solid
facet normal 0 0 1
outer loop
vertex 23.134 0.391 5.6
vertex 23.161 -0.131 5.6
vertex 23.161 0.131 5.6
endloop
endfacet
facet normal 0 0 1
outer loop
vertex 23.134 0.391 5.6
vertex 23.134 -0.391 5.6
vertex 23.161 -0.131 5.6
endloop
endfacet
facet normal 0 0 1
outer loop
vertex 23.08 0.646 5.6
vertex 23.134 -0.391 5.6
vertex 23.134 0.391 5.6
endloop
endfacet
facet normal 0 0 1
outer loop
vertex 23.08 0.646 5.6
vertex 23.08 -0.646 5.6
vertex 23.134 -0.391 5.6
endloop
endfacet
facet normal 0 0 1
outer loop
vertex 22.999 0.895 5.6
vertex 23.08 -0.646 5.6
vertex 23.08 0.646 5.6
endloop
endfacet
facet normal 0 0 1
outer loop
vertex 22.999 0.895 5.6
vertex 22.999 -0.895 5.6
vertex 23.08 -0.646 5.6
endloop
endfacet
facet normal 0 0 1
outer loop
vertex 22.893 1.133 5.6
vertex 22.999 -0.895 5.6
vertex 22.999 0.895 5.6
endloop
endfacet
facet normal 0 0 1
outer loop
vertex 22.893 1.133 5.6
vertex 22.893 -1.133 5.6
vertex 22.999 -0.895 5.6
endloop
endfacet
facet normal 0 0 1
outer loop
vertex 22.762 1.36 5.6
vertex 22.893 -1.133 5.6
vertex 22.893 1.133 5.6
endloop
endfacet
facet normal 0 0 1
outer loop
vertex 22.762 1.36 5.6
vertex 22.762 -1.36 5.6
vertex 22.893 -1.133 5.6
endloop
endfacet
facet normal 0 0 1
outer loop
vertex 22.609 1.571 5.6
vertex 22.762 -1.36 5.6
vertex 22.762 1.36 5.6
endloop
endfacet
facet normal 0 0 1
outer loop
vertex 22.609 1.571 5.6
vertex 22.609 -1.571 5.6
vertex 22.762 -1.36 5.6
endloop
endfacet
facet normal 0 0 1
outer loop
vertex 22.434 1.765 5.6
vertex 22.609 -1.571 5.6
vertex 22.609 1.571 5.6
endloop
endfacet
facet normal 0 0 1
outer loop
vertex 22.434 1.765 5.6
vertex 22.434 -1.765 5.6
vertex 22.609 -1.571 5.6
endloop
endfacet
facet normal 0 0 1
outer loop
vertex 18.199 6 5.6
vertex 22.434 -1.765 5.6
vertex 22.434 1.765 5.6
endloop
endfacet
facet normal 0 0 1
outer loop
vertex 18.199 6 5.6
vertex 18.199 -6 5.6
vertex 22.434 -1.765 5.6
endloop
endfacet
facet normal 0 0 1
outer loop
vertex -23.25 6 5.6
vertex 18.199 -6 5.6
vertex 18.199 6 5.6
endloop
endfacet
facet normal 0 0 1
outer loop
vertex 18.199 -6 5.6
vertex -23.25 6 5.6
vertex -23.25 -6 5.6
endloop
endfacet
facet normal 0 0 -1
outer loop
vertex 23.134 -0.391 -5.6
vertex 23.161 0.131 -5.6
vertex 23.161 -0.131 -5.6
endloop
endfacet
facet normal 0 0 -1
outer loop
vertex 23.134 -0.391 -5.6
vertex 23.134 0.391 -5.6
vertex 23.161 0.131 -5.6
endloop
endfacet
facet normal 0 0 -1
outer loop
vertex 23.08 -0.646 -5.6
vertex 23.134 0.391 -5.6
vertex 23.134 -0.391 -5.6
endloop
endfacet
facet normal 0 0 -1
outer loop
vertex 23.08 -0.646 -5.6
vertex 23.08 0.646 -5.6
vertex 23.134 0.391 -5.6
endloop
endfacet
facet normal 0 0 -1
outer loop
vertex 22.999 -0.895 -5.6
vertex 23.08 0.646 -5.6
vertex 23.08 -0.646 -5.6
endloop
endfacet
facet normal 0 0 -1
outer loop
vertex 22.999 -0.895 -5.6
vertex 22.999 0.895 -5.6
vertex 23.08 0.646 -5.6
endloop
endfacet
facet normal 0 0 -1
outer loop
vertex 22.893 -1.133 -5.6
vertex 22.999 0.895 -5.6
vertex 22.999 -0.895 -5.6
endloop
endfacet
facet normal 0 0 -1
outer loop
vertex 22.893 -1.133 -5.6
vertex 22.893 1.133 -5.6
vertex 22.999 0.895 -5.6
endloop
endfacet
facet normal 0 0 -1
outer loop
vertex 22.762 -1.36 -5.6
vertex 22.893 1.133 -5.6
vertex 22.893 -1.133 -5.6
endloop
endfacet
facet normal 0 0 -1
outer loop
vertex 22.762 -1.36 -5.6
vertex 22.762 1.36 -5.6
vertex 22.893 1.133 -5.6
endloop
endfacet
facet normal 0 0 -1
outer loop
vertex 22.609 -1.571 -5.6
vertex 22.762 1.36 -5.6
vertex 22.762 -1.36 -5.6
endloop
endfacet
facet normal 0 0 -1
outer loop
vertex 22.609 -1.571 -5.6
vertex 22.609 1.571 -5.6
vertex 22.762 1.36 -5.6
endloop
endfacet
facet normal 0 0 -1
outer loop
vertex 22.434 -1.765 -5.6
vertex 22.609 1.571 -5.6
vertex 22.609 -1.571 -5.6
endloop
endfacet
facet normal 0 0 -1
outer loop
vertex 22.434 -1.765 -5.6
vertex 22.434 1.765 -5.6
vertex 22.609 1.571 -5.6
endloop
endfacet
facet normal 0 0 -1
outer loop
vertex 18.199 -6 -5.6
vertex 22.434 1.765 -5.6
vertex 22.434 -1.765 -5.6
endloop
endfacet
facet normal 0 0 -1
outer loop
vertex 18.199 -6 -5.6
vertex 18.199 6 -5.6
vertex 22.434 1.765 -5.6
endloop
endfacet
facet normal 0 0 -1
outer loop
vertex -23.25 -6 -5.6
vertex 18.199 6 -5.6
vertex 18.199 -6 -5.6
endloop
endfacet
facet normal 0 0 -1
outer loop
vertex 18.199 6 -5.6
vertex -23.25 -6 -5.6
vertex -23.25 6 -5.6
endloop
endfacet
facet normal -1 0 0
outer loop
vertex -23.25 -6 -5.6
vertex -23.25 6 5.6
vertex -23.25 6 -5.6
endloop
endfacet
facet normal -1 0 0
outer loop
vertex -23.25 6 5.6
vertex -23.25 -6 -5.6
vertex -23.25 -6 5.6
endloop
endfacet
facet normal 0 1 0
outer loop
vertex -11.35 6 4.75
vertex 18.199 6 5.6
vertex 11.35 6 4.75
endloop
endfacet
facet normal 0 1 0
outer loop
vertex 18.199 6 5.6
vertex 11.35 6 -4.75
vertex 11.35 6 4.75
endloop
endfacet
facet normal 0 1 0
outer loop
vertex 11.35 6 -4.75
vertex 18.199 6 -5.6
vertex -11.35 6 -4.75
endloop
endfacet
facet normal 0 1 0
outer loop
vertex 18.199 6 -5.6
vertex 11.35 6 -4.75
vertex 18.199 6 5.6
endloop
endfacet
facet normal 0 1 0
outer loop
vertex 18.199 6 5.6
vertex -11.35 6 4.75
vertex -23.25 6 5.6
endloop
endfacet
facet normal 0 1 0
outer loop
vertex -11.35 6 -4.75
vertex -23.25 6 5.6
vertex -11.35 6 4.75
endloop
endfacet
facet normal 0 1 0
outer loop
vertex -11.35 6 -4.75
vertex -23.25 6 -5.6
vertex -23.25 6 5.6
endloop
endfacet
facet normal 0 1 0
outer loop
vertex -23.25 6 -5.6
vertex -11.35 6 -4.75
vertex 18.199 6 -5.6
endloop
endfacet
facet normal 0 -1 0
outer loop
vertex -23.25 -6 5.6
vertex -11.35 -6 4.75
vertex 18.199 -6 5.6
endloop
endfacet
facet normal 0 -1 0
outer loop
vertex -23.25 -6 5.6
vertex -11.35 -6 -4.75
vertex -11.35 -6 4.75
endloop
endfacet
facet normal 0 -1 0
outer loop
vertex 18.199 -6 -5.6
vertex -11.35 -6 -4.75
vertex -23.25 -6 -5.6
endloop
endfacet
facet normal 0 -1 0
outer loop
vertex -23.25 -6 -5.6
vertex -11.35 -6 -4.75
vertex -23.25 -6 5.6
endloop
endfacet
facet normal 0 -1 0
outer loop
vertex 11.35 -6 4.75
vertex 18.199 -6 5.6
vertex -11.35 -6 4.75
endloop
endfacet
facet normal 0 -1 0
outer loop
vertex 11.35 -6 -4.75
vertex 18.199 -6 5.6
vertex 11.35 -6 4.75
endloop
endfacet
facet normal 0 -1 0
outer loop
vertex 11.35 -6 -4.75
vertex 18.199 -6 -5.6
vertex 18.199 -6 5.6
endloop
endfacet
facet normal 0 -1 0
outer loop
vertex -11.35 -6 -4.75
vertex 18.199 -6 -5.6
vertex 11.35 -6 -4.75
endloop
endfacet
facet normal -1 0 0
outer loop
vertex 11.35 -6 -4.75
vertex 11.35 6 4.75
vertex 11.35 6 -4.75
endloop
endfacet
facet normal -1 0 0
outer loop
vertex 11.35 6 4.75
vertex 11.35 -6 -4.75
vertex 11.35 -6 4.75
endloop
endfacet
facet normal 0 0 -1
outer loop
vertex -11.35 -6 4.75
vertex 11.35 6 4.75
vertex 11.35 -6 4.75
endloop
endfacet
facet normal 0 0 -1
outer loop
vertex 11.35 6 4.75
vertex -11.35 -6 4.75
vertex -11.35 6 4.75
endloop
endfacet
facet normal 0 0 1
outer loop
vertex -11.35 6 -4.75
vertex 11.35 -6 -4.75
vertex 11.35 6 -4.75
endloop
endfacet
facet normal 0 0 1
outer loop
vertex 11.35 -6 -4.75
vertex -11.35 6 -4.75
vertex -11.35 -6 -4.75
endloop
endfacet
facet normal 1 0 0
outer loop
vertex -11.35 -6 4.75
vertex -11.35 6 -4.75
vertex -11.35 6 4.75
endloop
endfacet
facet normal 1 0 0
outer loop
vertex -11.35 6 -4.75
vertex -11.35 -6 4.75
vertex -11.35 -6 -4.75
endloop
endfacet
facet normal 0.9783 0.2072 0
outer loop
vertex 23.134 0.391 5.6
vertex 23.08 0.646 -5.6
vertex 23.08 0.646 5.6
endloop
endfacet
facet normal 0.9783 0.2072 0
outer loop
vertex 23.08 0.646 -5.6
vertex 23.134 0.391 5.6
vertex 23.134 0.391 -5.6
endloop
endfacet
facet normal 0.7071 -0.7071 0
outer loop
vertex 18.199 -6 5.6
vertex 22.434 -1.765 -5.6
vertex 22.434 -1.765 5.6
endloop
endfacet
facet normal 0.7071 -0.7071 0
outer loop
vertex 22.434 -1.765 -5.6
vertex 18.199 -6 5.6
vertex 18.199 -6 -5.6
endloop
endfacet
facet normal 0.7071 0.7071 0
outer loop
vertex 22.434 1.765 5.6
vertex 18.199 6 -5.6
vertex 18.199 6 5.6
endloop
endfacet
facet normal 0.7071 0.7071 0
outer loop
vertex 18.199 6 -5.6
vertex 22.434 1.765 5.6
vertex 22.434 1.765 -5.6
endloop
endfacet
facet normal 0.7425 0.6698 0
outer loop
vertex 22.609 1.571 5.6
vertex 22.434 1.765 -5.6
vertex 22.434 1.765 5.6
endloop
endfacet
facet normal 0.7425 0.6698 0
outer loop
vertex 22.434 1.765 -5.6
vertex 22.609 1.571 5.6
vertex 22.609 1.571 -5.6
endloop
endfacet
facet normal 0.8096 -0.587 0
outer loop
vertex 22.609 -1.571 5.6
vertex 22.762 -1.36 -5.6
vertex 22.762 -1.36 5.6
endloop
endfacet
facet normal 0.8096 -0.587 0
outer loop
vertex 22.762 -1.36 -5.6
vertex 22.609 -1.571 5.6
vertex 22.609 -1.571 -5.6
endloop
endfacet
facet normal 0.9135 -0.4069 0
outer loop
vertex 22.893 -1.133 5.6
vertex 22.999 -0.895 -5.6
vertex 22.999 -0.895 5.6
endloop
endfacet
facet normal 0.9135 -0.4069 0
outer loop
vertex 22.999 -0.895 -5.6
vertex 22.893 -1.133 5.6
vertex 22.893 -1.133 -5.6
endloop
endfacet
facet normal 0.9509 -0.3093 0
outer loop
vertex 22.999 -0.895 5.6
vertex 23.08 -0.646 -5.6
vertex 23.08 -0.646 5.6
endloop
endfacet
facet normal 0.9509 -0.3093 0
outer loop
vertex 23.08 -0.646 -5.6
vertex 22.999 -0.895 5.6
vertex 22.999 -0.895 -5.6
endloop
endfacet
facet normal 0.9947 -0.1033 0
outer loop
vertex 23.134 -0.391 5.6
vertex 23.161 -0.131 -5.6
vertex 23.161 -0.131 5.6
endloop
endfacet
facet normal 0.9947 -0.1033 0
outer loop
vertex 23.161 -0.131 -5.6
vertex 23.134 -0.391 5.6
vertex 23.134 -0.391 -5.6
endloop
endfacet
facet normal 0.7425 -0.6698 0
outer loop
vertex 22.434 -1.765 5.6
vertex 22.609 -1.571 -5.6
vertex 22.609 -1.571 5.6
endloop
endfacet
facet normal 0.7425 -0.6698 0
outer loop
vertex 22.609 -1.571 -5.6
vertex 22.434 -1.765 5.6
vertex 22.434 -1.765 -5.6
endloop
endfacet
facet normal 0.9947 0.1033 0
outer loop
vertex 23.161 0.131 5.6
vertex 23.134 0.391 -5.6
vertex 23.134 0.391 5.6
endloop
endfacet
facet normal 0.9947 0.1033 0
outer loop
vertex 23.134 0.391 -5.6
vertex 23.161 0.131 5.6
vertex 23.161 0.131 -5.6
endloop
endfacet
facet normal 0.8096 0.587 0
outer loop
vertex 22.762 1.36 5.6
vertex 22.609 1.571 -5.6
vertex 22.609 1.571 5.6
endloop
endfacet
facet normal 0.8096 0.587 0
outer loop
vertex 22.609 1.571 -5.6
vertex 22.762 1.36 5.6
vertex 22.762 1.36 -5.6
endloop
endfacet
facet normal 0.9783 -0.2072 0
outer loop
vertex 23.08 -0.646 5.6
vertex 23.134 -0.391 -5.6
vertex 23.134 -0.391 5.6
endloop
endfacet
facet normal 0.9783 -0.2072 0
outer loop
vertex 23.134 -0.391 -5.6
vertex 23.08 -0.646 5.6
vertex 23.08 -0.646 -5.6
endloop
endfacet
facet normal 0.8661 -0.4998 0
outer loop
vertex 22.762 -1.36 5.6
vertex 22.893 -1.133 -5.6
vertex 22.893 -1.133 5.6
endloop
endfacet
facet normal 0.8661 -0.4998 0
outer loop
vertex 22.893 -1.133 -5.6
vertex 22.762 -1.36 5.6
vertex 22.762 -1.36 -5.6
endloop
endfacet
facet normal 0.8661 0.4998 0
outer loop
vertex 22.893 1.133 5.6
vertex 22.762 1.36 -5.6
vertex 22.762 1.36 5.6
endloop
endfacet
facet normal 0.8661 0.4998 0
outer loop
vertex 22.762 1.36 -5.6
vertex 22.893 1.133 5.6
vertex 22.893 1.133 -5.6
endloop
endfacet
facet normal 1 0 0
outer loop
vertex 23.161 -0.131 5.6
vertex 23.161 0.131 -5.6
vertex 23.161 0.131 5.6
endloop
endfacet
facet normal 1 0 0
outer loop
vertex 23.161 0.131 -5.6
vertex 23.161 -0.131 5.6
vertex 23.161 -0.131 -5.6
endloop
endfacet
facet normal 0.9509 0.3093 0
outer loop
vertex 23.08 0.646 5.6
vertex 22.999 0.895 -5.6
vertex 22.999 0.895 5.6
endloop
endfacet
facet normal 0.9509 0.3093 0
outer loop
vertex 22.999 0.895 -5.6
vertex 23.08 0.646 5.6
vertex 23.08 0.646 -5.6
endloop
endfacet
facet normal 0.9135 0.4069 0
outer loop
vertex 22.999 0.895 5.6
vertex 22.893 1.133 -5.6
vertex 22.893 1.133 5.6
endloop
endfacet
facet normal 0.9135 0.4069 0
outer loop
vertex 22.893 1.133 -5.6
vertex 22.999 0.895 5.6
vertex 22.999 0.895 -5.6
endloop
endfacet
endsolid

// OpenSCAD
$fn=60;
spacing=46.5;


module frameLug() {
    cube([22.7,100,9.5], center=true);
}

module rounder() {
    translate([-12,0,0]) rotate([0,0,45]) minkowski() {
        cube([46.2,46.2,20], center=true);
        sphere(d=5);
    }
}

intersection() {
    rounder();
    difference() {
        #cube([spacing,12,11.2], center=true);
        translate([0,0,0]) frameLug();
    }
}
